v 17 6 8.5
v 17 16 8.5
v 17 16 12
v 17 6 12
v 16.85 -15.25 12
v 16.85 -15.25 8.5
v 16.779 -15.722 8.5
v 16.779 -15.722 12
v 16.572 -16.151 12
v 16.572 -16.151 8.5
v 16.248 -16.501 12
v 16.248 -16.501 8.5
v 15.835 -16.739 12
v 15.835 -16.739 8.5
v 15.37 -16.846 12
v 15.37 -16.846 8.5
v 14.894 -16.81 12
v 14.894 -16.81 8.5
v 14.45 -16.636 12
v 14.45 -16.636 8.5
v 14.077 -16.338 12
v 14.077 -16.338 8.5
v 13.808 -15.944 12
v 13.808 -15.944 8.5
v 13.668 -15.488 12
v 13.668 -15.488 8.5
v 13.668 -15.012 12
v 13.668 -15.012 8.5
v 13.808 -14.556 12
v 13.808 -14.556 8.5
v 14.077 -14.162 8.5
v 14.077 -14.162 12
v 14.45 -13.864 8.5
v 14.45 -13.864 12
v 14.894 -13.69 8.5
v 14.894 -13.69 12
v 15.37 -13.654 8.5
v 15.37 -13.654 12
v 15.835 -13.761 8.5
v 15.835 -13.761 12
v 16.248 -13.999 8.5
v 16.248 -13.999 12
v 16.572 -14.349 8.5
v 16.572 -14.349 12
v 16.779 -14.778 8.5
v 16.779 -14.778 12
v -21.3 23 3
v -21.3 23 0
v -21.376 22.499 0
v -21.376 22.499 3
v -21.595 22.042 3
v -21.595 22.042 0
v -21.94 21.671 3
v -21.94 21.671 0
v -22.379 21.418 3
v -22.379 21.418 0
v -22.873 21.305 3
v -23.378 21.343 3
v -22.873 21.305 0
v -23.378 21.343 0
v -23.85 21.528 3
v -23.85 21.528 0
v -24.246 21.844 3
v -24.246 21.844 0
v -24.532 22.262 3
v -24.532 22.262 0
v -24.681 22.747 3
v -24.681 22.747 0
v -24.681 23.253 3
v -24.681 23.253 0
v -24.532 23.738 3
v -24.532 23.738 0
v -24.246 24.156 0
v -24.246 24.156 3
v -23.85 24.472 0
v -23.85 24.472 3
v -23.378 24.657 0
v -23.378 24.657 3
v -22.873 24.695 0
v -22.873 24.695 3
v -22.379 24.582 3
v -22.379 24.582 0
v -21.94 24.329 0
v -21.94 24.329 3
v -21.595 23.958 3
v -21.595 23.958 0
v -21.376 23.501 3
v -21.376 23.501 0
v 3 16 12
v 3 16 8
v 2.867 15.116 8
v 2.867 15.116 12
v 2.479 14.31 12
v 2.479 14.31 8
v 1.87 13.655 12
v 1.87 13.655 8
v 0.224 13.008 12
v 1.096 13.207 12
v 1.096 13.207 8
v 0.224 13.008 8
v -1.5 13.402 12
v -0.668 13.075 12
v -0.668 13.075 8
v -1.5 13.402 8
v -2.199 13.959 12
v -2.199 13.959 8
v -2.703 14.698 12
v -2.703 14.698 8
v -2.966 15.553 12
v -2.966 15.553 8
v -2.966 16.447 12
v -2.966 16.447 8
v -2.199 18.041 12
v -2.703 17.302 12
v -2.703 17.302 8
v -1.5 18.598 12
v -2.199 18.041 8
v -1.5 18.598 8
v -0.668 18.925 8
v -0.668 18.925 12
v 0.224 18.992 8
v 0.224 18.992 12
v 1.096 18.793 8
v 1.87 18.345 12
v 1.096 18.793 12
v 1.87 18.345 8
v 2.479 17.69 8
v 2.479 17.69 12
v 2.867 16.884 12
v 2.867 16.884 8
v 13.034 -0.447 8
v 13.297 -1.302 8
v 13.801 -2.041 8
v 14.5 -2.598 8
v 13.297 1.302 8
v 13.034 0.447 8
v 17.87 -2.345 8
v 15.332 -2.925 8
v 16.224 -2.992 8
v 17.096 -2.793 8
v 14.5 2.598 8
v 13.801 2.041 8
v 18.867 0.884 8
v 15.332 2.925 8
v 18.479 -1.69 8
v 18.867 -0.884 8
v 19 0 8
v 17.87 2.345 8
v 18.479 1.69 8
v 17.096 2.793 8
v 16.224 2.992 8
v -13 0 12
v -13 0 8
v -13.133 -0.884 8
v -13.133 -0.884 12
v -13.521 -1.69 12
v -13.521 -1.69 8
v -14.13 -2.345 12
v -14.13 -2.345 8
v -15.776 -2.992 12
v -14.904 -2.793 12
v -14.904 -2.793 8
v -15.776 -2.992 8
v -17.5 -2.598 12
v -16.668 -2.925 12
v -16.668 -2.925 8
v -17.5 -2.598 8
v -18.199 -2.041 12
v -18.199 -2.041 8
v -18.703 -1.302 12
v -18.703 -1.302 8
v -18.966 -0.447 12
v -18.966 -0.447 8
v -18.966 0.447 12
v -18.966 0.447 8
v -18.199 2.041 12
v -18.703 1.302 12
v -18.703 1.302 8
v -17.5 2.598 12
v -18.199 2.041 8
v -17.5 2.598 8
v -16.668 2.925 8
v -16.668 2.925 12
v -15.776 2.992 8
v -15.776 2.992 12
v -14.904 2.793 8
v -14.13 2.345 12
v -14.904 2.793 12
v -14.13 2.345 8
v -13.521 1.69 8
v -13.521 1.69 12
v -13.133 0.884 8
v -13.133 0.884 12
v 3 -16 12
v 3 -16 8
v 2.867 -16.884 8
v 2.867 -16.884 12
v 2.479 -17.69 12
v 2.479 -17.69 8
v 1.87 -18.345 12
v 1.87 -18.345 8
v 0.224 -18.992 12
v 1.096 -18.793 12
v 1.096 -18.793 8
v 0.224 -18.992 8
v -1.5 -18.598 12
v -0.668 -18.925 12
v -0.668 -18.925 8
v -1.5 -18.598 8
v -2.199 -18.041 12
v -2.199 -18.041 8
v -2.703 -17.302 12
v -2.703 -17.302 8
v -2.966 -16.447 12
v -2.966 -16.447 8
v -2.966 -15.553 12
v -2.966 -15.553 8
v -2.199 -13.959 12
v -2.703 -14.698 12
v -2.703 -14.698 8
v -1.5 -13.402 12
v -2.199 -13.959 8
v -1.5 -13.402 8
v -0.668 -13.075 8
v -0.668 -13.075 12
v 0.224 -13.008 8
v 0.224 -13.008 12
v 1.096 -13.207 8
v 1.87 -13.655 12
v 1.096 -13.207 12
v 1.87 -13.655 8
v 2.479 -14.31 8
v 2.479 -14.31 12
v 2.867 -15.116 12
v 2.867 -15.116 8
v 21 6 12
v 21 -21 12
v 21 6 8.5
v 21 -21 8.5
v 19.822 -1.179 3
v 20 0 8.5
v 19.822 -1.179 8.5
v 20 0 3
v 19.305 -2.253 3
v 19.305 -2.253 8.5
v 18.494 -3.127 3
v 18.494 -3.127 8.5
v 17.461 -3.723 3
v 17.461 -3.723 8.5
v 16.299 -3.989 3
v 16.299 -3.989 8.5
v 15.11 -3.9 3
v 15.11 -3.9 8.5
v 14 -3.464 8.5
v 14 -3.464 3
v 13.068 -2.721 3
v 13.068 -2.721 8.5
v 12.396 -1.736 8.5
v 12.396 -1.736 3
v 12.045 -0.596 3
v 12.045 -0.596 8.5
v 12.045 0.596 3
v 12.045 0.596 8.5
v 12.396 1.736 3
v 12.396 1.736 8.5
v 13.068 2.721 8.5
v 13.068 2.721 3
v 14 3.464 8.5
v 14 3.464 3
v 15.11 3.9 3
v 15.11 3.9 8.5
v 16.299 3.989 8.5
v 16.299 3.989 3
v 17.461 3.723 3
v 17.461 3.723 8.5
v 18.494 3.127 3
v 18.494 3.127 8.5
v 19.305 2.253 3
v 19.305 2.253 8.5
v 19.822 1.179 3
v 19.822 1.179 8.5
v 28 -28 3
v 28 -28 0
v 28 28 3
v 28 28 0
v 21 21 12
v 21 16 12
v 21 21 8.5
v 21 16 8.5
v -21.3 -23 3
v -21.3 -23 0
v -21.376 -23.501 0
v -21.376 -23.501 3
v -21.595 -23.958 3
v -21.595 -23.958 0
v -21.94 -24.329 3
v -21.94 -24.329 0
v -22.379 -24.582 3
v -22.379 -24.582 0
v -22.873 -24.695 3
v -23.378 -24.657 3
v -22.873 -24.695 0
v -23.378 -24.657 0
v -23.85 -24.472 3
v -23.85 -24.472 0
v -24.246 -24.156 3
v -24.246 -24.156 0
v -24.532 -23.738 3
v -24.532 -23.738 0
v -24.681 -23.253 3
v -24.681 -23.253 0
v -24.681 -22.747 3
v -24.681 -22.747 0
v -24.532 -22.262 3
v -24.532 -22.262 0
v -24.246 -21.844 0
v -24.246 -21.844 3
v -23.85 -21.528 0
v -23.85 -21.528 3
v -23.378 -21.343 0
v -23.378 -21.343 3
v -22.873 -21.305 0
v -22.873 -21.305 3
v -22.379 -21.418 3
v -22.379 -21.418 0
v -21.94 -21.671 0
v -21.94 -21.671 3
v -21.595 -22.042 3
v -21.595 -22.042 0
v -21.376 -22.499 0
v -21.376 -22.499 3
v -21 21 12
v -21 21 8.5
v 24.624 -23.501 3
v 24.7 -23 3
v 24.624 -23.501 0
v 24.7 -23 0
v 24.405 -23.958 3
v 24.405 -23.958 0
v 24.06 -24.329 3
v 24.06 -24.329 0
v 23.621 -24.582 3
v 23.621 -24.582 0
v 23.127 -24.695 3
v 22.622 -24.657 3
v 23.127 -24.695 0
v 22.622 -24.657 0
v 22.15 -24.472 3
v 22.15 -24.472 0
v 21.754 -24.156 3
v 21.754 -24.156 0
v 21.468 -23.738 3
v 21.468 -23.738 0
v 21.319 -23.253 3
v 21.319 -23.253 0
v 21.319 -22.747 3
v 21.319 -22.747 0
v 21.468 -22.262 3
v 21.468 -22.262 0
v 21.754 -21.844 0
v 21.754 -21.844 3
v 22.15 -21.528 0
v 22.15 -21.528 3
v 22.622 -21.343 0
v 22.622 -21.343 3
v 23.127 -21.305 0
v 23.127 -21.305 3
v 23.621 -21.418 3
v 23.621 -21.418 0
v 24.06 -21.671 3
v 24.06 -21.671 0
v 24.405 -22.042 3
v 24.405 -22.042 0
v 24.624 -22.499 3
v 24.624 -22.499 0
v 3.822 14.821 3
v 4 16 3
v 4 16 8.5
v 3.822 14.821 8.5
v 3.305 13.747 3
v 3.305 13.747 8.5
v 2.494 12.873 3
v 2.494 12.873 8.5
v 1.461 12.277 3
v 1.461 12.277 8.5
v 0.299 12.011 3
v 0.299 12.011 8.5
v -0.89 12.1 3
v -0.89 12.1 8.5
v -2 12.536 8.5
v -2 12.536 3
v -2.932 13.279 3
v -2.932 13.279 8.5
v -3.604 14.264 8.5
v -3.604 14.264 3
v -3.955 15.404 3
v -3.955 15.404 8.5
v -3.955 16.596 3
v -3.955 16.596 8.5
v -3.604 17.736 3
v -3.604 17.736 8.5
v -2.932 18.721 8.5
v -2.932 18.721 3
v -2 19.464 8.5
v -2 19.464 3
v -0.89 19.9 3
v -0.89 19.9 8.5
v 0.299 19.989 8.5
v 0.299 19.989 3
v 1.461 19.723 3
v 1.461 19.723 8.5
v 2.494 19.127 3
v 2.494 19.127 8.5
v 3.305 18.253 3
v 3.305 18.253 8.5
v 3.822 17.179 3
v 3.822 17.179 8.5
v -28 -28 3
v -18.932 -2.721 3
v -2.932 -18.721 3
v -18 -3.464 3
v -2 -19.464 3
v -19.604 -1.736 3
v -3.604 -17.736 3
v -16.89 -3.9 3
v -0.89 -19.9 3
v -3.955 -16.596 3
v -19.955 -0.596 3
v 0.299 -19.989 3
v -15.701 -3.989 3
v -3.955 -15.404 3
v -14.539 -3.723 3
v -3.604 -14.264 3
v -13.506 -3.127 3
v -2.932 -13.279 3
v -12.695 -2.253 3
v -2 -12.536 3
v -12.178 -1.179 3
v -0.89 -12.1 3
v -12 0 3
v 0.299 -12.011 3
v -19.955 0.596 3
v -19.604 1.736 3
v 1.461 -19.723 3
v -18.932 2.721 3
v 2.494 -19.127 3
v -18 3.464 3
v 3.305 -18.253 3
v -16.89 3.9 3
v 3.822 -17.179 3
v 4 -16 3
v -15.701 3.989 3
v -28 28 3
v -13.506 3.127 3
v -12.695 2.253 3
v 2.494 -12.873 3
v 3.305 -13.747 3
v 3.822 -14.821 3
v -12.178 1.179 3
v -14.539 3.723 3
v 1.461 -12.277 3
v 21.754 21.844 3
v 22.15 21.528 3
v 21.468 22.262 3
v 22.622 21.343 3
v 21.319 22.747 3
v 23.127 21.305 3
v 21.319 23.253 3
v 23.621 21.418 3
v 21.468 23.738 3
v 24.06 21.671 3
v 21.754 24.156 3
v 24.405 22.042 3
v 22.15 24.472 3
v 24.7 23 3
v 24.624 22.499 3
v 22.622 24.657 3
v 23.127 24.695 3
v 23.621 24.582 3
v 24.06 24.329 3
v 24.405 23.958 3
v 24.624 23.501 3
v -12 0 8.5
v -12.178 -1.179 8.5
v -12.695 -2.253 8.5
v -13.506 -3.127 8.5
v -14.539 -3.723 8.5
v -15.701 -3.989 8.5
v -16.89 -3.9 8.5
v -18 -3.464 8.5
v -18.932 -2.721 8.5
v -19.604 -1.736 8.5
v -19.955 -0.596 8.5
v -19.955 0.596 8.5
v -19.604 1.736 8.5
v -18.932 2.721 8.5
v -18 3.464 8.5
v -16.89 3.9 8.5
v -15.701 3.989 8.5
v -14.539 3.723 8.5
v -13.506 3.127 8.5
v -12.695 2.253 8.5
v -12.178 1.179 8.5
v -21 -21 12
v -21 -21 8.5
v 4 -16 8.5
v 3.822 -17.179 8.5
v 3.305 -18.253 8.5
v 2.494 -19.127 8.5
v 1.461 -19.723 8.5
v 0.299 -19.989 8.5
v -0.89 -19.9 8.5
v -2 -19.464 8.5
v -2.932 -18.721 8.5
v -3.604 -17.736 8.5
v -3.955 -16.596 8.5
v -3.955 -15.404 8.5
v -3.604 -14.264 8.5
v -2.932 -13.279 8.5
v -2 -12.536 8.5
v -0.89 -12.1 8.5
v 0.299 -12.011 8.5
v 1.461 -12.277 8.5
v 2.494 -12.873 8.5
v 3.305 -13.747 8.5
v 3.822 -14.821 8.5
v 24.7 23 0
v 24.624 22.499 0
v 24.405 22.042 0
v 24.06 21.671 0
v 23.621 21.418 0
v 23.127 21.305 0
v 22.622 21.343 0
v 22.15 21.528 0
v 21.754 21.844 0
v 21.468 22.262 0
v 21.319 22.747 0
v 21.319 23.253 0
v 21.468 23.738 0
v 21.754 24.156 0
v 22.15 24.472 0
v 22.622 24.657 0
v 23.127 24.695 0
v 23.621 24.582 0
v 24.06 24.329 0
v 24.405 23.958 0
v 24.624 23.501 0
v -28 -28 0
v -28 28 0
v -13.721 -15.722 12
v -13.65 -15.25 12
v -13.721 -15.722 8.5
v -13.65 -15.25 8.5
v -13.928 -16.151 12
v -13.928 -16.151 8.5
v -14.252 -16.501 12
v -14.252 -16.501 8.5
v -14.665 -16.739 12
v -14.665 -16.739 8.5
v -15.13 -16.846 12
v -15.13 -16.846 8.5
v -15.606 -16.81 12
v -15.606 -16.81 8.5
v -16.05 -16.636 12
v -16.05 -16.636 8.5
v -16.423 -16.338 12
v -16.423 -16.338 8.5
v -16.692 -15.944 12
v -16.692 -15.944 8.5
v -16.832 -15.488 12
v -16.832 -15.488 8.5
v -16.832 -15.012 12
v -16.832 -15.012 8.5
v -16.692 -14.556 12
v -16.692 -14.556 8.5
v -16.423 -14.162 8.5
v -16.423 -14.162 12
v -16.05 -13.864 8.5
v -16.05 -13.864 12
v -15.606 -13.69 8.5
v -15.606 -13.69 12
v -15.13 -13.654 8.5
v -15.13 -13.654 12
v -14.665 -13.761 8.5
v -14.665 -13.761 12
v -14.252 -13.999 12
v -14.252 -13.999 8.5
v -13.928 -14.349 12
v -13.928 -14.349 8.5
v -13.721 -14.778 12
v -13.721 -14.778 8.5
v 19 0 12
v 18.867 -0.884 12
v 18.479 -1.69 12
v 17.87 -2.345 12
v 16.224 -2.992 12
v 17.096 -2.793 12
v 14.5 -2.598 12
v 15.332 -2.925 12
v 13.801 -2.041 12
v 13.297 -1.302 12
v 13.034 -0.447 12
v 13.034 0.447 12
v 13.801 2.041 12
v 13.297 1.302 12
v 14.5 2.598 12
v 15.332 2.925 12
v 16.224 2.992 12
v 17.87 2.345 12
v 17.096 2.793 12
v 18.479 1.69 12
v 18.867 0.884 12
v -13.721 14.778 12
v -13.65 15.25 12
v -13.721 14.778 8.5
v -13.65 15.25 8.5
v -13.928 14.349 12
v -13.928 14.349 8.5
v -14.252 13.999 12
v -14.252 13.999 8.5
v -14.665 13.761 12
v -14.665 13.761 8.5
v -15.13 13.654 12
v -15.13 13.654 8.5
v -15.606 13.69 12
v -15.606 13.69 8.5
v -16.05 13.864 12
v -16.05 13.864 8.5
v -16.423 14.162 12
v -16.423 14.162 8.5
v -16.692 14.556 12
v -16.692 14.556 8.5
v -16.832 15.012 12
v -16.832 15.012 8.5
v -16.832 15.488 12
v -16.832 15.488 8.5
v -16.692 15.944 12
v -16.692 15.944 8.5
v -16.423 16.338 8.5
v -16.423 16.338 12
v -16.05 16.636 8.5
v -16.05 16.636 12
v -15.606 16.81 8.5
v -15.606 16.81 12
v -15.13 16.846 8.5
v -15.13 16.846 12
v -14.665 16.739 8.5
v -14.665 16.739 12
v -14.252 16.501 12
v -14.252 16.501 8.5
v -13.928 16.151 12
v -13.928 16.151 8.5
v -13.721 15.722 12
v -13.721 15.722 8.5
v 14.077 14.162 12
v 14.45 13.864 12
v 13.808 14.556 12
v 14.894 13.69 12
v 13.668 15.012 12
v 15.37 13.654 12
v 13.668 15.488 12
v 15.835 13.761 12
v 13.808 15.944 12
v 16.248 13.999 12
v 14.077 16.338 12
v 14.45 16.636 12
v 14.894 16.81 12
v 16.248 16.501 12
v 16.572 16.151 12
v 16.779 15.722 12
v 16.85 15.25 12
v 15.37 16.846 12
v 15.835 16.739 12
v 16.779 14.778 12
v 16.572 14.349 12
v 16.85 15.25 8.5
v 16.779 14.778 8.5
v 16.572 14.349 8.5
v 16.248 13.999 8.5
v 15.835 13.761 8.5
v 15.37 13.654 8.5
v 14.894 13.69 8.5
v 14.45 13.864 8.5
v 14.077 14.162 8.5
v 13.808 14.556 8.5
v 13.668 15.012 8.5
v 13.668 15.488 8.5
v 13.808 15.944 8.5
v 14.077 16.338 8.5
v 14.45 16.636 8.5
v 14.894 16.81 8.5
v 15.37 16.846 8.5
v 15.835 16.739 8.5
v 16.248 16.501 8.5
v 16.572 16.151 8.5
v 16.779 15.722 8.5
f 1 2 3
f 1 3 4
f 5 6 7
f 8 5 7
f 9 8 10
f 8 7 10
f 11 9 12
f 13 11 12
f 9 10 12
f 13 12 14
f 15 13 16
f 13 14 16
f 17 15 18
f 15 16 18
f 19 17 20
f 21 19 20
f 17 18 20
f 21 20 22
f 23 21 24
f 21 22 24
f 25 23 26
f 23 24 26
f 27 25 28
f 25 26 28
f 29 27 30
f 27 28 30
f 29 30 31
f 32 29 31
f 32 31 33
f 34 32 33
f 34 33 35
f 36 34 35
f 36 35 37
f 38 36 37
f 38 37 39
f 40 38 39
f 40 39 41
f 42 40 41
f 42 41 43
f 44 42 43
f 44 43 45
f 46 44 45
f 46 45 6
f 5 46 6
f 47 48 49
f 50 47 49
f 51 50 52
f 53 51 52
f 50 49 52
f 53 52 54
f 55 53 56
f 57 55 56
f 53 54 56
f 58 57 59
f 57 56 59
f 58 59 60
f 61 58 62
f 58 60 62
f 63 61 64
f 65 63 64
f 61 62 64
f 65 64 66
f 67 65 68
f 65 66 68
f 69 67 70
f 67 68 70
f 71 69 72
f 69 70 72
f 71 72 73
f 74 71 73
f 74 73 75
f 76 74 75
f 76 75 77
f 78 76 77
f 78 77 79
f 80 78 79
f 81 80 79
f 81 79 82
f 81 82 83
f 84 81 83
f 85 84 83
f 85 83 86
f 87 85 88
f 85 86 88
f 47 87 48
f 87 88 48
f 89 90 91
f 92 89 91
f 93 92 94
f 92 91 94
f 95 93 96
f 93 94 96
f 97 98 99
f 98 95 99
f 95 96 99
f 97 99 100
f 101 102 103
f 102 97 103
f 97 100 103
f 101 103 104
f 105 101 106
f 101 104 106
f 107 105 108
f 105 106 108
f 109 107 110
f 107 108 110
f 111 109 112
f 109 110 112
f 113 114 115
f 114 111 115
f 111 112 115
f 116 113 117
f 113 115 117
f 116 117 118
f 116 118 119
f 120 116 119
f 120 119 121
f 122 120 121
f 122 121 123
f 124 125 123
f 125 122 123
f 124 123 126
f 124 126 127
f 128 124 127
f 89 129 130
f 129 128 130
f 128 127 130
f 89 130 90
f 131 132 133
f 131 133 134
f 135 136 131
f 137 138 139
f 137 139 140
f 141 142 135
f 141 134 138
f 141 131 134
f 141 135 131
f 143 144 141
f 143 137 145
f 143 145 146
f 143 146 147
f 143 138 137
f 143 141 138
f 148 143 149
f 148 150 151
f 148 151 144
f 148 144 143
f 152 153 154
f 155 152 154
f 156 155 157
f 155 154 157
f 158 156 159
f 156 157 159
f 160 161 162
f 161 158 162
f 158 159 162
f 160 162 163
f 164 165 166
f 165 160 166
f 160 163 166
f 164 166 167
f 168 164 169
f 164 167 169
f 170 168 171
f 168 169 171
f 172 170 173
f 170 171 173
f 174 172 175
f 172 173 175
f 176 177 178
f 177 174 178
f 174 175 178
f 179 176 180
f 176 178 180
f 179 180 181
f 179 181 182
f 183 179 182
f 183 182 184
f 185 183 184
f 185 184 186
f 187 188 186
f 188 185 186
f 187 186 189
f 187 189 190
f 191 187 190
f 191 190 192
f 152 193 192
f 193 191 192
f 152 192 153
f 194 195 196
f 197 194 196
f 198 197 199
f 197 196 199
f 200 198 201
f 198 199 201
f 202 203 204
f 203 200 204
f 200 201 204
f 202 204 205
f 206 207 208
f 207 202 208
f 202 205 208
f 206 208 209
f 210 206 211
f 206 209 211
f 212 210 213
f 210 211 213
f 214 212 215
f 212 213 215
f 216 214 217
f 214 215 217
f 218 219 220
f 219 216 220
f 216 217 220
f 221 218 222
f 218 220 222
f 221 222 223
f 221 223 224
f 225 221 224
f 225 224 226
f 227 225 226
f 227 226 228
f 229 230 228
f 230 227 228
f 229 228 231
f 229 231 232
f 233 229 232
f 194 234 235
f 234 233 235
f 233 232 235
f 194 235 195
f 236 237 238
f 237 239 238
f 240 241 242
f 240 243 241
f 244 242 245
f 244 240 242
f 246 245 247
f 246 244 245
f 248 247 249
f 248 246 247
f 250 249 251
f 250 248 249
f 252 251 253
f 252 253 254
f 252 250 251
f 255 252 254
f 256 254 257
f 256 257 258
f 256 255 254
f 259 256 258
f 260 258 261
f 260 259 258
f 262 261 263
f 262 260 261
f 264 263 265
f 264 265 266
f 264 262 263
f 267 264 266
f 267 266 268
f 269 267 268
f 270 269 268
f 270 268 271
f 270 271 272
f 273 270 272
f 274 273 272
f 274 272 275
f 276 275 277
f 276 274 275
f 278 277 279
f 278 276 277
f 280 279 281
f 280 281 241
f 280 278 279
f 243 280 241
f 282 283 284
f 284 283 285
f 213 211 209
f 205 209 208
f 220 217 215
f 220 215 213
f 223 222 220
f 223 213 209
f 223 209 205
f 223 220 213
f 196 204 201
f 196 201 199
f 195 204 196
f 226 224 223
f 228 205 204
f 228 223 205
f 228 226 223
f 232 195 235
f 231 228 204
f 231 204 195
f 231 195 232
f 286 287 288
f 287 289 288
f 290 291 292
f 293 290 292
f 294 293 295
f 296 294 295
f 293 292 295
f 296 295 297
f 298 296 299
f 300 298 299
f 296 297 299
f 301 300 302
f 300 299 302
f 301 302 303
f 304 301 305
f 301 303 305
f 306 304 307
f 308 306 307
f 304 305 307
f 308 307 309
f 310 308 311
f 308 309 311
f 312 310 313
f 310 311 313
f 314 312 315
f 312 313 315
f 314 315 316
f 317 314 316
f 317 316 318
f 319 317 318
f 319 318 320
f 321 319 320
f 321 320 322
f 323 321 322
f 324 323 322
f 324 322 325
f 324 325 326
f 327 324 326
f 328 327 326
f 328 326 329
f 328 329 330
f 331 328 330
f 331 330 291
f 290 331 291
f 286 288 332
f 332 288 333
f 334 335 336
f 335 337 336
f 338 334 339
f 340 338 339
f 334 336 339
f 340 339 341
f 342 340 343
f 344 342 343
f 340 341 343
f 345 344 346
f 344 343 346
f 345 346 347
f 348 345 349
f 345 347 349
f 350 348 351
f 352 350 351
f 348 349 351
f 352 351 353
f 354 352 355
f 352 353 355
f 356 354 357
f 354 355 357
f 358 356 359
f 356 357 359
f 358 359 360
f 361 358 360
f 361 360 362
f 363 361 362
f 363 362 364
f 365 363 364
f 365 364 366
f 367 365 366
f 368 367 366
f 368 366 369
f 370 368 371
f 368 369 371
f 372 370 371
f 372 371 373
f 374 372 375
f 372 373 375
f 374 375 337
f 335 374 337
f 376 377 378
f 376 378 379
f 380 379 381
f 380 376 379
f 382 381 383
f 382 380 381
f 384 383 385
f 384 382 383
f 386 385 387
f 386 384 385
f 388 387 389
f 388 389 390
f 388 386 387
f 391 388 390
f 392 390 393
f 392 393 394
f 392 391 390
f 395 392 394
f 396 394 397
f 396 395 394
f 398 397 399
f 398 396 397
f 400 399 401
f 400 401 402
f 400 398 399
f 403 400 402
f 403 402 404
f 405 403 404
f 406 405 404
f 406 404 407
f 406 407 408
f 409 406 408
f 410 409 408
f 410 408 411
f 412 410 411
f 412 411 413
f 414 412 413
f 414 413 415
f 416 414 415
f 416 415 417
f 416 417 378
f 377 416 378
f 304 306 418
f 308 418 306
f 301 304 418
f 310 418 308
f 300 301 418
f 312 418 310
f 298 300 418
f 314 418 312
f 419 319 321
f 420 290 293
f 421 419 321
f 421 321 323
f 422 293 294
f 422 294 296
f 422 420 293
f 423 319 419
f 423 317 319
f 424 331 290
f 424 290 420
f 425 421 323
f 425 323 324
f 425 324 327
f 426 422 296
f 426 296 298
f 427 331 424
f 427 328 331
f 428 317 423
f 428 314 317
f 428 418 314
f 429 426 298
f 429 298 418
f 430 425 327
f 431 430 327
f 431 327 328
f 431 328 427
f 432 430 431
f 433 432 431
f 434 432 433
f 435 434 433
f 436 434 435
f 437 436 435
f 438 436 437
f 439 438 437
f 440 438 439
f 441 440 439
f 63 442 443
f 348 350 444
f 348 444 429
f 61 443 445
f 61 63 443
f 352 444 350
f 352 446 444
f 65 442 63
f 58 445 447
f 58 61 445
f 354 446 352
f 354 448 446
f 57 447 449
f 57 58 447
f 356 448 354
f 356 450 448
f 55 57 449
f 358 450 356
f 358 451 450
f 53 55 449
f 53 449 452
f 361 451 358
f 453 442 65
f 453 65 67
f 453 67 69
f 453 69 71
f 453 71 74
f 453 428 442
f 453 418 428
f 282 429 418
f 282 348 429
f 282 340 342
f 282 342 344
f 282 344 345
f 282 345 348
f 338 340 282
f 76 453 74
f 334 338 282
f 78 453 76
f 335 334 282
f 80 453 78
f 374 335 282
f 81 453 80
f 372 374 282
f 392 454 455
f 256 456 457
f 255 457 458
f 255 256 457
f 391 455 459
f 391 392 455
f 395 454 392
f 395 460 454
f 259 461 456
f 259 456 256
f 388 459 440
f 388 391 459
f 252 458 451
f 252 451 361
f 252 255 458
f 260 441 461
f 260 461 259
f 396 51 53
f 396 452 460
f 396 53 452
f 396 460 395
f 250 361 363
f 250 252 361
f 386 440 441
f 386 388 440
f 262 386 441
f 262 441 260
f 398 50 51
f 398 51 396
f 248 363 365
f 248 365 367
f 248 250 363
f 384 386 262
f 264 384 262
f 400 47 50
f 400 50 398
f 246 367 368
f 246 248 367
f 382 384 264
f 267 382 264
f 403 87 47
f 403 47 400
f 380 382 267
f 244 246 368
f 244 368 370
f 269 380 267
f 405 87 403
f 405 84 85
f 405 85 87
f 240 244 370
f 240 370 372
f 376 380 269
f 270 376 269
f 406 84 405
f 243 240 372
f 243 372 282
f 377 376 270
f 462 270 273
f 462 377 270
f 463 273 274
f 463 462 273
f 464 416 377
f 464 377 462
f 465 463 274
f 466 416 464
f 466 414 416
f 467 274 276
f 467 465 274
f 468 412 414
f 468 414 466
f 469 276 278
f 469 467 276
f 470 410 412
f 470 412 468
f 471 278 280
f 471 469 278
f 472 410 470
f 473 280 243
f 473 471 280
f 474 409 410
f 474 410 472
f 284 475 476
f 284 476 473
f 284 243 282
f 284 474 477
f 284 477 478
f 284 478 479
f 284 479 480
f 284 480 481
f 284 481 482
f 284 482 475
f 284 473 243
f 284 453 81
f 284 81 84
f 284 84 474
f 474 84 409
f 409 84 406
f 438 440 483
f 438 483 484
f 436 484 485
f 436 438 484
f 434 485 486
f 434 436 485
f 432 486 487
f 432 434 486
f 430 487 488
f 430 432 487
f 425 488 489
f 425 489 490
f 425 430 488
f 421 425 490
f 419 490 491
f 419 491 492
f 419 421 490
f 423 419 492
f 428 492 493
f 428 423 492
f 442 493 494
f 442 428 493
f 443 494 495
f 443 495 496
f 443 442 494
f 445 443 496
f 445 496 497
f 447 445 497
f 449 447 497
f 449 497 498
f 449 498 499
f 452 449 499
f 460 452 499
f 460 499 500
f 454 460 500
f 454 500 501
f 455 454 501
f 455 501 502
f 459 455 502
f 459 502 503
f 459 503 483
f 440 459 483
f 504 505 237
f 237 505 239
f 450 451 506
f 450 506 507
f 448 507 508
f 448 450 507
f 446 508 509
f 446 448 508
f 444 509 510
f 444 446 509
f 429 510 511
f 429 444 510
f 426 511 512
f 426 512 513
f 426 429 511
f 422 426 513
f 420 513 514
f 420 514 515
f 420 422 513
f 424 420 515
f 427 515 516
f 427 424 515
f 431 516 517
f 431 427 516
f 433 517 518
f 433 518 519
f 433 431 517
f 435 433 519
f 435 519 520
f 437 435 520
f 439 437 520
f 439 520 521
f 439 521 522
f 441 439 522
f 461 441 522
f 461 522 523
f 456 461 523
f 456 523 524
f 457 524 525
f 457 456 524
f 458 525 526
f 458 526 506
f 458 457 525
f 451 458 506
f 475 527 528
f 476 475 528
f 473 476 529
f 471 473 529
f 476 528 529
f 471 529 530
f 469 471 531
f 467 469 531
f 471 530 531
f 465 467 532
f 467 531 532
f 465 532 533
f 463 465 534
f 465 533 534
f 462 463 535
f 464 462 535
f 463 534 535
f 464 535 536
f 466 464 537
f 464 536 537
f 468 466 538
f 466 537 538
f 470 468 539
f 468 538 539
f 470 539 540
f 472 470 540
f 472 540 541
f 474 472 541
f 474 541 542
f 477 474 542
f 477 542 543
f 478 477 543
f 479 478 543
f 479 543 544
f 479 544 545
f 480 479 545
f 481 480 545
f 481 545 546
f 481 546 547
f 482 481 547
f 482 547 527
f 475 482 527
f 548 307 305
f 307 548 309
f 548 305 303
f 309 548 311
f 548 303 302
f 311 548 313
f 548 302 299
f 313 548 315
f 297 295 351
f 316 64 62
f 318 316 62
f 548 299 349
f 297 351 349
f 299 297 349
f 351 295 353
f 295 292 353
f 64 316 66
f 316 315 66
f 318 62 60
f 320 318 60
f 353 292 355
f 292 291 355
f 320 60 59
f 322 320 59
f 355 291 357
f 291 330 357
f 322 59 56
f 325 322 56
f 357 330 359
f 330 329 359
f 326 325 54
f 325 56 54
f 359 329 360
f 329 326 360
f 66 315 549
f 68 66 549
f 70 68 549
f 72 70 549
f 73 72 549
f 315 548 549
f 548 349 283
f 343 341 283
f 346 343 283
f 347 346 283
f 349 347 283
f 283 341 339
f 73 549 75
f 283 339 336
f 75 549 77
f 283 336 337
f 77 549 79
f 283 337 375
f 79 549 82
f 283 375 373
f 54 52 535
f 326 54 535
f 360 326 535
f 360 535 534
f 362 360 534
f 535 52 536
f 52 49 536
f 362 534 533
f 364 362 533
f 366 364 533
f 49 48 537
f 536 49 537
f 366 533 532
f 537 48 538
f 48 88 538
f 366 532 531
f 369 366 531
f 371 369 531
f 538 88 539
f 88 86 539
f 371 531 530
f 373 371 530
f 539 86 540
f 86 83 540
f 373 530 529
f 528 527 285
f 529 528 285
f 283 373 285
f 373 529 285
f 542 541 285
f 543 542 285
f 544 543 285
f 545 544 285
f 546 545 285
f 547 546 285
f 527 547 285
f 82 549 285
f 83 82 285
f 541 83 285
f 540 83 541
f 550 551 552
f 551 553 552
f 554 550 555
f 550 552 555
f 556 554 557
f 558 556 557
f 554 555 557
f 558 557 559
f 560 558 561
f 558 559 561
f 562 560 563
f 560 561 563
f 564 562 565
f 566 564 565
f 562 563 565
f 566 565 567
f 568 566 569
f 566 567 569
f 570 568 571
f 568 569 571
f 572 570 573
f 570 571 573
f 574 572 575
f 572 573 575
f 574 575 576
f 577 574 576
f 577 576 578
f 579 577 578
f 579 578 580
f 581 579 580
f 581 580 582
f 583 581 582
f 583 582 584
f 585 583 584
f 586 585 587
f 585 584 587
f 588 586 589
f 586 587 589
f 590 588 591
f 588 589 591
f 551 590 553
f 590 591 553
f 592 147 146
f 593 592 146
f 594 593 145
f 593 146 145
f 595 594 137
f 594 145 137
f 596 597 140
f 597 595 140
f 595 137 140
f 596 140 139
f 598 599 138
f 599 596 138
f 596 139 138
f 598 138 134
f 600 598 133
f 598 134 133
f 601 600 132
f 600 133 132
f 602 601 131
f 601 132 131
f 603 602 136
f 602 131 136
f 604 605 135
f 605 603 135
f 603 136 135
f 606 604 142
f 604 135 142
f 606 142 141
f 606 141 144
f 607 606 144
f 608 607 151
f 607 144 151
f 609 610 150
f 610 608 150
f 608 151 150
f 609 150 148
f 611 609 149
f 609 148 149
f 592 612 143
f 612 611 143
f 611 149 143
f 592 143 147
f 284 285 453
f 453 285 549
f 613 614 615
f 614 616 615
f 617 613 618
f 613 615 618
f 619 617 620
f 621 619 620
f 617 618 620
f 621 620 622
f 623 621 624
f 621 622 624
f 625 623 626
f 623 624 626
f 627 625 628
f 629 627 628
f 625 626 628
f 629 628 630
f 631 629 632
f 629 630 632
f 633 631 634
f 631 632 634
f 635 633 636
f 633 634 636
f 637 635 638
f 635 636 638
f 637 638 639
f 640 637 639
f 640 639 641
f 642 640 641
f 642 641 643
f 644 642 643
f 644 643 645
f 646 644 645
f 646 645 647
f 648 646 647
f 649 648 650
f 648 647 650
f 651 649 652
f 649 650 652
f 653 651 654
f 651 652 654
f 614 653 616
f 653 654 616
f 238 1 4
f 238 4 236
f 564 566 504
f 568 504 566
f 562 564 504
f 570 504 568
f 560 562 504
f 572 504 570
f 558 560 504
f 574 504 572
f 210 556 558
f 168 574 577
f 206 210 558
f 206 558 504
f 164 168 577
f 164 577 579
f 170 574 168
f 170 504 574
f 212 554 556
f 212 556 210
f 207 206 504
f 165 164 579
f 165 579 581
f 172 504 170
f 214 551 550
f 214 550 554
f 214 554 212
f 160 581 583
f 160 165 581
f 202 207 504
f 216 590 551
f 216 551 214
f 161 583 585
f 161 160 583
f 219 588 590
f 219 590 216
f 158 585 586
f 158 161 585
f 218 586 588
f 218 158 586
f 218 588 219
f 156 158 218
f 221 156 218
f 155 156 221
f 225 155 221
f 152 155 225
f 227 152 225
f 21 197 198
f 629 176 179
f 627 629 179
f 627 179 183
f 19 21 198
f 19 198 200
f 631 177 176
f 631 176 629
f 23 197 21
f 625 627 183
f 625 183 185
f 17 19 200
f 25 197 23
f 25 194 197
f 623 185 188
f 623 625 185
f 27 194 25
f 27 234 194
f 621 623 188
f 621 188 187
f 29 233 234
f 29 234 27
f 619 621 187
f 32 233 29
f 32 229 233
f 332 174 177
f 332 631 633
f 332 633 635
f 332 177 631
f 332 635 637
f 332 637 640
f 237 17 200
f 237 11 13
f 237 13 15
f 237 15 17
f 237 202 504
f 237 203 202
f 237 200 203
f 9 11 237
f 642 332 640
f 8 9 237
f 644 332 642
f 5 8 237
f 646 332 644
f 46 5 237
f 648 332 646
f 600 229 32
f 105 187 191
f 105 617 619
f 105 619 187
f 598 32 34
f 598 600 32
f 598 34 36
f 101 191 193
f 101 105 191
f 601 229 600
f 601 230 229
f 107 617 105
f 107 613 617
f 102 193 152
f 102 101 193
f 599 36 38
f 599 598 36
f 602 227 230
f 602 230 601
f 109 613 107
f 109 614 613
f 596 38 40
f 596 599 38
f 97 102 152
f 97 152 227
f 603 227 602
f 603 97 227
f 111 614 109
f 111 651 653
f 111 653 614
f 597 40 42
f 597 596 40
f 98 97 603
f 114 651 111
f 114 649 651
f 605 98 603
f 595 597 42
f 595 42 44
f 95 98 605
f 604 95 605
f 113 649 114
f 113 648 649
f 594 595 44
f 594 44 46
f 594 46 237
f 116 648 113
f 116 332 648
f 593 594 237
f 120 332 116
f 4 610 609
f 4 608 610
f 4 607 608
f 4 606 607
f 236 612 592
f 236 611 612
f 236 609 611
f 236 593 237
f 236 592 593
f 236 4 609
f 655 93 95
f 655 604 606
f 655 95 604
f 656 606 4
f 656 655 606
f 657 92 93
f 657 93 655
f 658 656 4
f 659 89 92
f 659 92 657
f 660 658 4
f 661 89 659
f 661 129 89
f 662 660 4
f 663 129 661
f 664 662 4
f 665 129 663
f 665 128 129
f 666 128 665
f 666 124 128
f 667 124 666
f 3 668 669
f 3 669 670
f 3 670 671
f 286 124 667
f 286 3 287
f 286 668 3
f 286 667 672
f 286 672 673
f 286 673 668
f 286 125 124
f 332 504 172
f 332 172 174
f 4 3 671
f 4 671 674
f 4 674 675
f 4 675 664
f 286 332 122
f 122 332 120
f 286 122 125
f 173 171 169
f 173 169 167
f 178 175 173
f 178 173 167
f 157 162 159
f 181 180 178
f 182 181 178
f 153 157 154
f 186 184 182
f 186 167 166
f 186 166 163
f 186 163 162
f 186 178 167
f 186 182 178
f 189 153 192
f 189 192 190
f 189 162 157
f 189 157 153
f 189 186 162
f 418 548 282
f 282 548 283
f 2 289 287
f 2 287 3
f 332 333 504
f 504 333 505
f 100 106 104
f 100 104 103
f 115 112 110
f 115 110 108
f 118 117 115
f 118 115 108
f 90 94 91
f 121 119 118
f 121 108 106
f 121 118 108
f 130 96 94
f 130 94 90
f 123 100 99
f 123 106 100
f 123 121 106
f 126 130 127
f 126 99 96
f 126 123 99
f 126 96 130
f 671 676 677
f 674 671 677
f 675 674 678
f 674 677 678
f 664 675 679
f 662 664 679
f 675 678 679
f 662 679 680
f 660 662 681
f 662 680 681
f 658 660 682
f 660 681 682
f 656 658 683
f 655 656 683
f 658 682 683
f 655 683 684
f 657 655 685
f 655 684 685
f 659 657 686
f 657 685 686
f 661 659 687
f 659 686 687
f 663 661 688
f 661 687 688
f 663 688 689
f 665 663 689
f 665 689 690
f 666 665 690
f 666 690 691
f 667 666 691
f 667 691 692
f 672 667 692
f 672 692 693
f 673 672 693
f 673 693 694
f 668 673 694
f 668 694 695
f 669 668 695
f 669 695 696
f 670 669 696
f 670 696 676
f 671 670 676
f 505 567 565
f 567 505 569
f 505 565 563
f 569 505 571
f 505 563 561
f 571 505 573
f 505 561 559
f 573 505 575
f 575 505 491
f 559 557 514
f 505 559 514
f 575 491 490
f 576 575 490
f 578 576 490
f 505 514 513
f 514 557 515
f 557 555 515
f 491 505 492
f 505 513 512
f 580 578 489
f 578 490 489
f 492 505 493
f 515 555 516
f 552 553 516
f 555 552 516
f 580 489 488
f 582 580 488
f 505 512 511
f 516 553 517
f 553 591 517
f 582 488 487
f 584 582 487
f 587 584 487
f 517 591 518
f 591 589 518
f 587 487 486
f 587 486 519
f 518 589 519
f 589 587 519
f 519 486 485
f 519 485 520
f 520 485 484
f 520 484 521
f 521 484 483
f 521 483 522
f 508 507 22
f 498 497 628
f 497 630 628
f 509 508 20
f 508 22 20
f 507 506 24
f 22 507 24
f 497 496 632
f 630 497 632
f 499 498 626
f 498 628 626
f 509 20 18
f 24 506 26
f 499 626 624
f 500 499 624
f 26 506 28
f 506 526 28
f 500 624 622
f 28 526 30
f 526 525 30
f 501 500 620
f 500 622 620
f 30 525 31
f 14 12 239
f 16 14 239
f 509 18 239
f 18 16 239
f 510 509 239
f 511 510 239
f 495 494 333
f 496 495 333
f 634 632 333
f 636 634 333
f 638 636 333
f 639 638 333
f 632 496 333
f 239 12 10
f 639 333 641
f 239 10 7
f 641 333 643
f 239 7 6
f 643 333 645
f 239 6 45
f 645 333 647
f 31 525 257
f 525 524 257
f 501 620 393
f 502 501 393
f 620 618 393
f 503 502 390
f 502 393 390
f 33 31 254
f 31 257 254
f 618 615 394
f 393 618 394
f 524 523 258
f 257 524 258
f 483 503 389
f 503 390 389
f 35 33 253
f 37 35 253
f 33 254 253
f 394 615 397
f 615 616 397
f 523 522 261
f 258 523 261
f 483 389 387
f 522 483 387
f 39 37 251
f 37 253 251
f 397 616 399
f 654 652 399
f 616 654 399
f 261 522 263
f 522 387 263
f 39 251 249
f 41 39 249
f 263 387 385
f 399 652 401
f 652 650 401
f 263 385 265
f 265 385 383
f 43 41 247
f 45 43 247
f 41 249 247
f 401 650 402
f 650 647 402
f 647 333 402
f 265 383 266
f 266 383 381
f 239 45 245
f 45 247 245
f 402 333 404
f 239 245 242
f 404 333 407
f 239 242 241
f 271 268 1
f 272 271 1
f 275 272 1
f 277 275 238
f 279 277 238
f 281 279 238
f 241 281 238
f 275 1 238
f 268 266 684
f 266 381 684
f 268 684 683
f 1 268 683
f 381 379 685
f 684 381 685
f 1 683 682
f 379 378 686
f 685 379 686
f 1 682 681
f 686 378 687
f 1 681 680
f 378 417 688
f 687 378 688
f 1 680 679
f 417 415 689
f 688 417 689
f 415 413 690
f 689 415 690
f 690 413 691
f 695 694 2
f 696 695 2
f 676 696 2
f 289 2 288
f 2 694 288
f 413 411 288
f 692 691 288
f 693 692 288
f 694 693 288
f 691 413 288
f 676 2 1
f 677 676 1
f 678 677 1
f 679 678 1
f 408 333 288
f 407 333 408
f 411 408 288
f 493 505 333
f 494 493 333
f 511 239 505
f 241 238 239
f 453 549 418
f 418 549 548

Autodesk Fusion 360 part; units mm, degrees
sketch "Sketch1" plane through (0, 0, 0) normal (0, 0, 1) x (1, 0, 0) in component "FC_TRAY_V1"
  line L0 (-28, -28) -> (28, -28)
  line L1 (28, -28) -> (28, 28)
  line L2 (28, 28) -> (-28, 28)
  line L3 (-28, 28) -> (-28, -28)
extrude "Extrude1" add sketch "Sketch1" along normal blind 3 makes body 1 in component "FC_TRAY_V1"
sketch "Sketch2" plane through (0, 0, 0) normal (0, 0, 1) x (1, 0, 0) in component "FC_TRAY_V1"
  circle A0 centre (16, 0) radius 4
  circle A1 centre (-16, 0) radius 4
  circle A2 centre (0, 16) radius 4
  circle A3 centre (0, -16) radius 4
extrude "Extrude2" add sketch "Sketch2" along normal blind 6.5 from surface at 2.5 separate body makes body 2 at (19.9801, -0.3983, 6.8333) makes body 3 at (3.9801, 15.6017, 6.8333) makes body 4 at (-12.0199, -0.3983, 6.8333) makes body 5 at (3.9801, -16.3983, 6.8333) in component "FC_TRAY_V1"
sketch "Sketch3" plane through (0, 0, 0) normal (0, 0, 1) x (1, 0, 0) in component "FC_TRAY_V1"
  line L0 (-21, -21) -> (21, -21)
  line L1 (21, -21) -> (21, 21)
  line L2 (21, 21) -> (-21, 21)
  line L3 (-21, 21) -> (-21, -21)
extrude "Extrude3" add sketch "Sketch3" along normal blind 3.5 from surface at 8.5 separate body makes body 6 in component "FC_TRAY_V1"
combine "Combine1" operation add target body 1 tool bodies 2 3 4 5 6 in component "FC_TRAY_V1"
sketch "Sketch4" plane through (0, 0, 0) normal (0, 0, 1) x (1, 0, 0) in component "FC_TRAY_V1"
  circle A0 centre (23, 23) radius 1.7
  circle A1 centre (-23, 23) radius 1.7
  circle A2 centre (23, -23) radius 1.7
  circle A3 centre (-23, -23) radius 1.7
extrude "Extrude4" cut sketch "Sketch4" along normal blind 5 from surface at -1 bodies 1 in component "FC_TRAY_V1"
sketch "Sketch5" plane through (0, 0, 0) normal (0, 0, 1) x (1, 0, 0) in component "FC_TRAY_V1"
  circle A0 centre (15.25, 15.25) radius 1.6
  circle A1 centre (-15.25, 15.25) radius 1.6
  circle A2 centre (15.25, -15.25) radius 1.6
  circle A3 centre (-15.25, -15.25) radius 1.6
extrude "Extrude5" cut sketch "Sketch5" along normal blind 5 from surface at 8 bodies 1 in component "FC_TRAY_V1"
sketch "Sketch6" plane through (0, 0, 0) normal (0, 0, 1) x (1, 0, 0) in component "FC_TRAY_V1"
  circle A0 centre (16, 0) radius 3
  circle A1 centre (-16, 0) radius 3
  circle A2 centre (0, 16) radius 3
  circle A3 centre (0, -16) radius 3
extrude "Extrude6" cut sketch "Sketch6" along normal blind 4 from surface at 8 bodies 1 in component "FC_TRAY_V1"
sketch "Sketch7" plane through (0, 0, 0) normal (0, 0, 1) x (1, 0, 0) in component "FC_TRAY_V1"
  line L0 (17, 6) -> (21, 6)
  line L1 (21, 6) -> (21, 16)
  line L2 (21, 16) -> (17, 16)
  line L3 (17, 16) -> (17, 6)
extrude "Extrude7" cut sketch "Sketch7" along normal blind 5 from surface at 8 bodies 1 in component "FC_TRAY_V1"
component "FC_TRAY_V1" placed x (1, 0, 0) y (0, 1, 0) z (0, 0, 1) at (0, 0, 0)
